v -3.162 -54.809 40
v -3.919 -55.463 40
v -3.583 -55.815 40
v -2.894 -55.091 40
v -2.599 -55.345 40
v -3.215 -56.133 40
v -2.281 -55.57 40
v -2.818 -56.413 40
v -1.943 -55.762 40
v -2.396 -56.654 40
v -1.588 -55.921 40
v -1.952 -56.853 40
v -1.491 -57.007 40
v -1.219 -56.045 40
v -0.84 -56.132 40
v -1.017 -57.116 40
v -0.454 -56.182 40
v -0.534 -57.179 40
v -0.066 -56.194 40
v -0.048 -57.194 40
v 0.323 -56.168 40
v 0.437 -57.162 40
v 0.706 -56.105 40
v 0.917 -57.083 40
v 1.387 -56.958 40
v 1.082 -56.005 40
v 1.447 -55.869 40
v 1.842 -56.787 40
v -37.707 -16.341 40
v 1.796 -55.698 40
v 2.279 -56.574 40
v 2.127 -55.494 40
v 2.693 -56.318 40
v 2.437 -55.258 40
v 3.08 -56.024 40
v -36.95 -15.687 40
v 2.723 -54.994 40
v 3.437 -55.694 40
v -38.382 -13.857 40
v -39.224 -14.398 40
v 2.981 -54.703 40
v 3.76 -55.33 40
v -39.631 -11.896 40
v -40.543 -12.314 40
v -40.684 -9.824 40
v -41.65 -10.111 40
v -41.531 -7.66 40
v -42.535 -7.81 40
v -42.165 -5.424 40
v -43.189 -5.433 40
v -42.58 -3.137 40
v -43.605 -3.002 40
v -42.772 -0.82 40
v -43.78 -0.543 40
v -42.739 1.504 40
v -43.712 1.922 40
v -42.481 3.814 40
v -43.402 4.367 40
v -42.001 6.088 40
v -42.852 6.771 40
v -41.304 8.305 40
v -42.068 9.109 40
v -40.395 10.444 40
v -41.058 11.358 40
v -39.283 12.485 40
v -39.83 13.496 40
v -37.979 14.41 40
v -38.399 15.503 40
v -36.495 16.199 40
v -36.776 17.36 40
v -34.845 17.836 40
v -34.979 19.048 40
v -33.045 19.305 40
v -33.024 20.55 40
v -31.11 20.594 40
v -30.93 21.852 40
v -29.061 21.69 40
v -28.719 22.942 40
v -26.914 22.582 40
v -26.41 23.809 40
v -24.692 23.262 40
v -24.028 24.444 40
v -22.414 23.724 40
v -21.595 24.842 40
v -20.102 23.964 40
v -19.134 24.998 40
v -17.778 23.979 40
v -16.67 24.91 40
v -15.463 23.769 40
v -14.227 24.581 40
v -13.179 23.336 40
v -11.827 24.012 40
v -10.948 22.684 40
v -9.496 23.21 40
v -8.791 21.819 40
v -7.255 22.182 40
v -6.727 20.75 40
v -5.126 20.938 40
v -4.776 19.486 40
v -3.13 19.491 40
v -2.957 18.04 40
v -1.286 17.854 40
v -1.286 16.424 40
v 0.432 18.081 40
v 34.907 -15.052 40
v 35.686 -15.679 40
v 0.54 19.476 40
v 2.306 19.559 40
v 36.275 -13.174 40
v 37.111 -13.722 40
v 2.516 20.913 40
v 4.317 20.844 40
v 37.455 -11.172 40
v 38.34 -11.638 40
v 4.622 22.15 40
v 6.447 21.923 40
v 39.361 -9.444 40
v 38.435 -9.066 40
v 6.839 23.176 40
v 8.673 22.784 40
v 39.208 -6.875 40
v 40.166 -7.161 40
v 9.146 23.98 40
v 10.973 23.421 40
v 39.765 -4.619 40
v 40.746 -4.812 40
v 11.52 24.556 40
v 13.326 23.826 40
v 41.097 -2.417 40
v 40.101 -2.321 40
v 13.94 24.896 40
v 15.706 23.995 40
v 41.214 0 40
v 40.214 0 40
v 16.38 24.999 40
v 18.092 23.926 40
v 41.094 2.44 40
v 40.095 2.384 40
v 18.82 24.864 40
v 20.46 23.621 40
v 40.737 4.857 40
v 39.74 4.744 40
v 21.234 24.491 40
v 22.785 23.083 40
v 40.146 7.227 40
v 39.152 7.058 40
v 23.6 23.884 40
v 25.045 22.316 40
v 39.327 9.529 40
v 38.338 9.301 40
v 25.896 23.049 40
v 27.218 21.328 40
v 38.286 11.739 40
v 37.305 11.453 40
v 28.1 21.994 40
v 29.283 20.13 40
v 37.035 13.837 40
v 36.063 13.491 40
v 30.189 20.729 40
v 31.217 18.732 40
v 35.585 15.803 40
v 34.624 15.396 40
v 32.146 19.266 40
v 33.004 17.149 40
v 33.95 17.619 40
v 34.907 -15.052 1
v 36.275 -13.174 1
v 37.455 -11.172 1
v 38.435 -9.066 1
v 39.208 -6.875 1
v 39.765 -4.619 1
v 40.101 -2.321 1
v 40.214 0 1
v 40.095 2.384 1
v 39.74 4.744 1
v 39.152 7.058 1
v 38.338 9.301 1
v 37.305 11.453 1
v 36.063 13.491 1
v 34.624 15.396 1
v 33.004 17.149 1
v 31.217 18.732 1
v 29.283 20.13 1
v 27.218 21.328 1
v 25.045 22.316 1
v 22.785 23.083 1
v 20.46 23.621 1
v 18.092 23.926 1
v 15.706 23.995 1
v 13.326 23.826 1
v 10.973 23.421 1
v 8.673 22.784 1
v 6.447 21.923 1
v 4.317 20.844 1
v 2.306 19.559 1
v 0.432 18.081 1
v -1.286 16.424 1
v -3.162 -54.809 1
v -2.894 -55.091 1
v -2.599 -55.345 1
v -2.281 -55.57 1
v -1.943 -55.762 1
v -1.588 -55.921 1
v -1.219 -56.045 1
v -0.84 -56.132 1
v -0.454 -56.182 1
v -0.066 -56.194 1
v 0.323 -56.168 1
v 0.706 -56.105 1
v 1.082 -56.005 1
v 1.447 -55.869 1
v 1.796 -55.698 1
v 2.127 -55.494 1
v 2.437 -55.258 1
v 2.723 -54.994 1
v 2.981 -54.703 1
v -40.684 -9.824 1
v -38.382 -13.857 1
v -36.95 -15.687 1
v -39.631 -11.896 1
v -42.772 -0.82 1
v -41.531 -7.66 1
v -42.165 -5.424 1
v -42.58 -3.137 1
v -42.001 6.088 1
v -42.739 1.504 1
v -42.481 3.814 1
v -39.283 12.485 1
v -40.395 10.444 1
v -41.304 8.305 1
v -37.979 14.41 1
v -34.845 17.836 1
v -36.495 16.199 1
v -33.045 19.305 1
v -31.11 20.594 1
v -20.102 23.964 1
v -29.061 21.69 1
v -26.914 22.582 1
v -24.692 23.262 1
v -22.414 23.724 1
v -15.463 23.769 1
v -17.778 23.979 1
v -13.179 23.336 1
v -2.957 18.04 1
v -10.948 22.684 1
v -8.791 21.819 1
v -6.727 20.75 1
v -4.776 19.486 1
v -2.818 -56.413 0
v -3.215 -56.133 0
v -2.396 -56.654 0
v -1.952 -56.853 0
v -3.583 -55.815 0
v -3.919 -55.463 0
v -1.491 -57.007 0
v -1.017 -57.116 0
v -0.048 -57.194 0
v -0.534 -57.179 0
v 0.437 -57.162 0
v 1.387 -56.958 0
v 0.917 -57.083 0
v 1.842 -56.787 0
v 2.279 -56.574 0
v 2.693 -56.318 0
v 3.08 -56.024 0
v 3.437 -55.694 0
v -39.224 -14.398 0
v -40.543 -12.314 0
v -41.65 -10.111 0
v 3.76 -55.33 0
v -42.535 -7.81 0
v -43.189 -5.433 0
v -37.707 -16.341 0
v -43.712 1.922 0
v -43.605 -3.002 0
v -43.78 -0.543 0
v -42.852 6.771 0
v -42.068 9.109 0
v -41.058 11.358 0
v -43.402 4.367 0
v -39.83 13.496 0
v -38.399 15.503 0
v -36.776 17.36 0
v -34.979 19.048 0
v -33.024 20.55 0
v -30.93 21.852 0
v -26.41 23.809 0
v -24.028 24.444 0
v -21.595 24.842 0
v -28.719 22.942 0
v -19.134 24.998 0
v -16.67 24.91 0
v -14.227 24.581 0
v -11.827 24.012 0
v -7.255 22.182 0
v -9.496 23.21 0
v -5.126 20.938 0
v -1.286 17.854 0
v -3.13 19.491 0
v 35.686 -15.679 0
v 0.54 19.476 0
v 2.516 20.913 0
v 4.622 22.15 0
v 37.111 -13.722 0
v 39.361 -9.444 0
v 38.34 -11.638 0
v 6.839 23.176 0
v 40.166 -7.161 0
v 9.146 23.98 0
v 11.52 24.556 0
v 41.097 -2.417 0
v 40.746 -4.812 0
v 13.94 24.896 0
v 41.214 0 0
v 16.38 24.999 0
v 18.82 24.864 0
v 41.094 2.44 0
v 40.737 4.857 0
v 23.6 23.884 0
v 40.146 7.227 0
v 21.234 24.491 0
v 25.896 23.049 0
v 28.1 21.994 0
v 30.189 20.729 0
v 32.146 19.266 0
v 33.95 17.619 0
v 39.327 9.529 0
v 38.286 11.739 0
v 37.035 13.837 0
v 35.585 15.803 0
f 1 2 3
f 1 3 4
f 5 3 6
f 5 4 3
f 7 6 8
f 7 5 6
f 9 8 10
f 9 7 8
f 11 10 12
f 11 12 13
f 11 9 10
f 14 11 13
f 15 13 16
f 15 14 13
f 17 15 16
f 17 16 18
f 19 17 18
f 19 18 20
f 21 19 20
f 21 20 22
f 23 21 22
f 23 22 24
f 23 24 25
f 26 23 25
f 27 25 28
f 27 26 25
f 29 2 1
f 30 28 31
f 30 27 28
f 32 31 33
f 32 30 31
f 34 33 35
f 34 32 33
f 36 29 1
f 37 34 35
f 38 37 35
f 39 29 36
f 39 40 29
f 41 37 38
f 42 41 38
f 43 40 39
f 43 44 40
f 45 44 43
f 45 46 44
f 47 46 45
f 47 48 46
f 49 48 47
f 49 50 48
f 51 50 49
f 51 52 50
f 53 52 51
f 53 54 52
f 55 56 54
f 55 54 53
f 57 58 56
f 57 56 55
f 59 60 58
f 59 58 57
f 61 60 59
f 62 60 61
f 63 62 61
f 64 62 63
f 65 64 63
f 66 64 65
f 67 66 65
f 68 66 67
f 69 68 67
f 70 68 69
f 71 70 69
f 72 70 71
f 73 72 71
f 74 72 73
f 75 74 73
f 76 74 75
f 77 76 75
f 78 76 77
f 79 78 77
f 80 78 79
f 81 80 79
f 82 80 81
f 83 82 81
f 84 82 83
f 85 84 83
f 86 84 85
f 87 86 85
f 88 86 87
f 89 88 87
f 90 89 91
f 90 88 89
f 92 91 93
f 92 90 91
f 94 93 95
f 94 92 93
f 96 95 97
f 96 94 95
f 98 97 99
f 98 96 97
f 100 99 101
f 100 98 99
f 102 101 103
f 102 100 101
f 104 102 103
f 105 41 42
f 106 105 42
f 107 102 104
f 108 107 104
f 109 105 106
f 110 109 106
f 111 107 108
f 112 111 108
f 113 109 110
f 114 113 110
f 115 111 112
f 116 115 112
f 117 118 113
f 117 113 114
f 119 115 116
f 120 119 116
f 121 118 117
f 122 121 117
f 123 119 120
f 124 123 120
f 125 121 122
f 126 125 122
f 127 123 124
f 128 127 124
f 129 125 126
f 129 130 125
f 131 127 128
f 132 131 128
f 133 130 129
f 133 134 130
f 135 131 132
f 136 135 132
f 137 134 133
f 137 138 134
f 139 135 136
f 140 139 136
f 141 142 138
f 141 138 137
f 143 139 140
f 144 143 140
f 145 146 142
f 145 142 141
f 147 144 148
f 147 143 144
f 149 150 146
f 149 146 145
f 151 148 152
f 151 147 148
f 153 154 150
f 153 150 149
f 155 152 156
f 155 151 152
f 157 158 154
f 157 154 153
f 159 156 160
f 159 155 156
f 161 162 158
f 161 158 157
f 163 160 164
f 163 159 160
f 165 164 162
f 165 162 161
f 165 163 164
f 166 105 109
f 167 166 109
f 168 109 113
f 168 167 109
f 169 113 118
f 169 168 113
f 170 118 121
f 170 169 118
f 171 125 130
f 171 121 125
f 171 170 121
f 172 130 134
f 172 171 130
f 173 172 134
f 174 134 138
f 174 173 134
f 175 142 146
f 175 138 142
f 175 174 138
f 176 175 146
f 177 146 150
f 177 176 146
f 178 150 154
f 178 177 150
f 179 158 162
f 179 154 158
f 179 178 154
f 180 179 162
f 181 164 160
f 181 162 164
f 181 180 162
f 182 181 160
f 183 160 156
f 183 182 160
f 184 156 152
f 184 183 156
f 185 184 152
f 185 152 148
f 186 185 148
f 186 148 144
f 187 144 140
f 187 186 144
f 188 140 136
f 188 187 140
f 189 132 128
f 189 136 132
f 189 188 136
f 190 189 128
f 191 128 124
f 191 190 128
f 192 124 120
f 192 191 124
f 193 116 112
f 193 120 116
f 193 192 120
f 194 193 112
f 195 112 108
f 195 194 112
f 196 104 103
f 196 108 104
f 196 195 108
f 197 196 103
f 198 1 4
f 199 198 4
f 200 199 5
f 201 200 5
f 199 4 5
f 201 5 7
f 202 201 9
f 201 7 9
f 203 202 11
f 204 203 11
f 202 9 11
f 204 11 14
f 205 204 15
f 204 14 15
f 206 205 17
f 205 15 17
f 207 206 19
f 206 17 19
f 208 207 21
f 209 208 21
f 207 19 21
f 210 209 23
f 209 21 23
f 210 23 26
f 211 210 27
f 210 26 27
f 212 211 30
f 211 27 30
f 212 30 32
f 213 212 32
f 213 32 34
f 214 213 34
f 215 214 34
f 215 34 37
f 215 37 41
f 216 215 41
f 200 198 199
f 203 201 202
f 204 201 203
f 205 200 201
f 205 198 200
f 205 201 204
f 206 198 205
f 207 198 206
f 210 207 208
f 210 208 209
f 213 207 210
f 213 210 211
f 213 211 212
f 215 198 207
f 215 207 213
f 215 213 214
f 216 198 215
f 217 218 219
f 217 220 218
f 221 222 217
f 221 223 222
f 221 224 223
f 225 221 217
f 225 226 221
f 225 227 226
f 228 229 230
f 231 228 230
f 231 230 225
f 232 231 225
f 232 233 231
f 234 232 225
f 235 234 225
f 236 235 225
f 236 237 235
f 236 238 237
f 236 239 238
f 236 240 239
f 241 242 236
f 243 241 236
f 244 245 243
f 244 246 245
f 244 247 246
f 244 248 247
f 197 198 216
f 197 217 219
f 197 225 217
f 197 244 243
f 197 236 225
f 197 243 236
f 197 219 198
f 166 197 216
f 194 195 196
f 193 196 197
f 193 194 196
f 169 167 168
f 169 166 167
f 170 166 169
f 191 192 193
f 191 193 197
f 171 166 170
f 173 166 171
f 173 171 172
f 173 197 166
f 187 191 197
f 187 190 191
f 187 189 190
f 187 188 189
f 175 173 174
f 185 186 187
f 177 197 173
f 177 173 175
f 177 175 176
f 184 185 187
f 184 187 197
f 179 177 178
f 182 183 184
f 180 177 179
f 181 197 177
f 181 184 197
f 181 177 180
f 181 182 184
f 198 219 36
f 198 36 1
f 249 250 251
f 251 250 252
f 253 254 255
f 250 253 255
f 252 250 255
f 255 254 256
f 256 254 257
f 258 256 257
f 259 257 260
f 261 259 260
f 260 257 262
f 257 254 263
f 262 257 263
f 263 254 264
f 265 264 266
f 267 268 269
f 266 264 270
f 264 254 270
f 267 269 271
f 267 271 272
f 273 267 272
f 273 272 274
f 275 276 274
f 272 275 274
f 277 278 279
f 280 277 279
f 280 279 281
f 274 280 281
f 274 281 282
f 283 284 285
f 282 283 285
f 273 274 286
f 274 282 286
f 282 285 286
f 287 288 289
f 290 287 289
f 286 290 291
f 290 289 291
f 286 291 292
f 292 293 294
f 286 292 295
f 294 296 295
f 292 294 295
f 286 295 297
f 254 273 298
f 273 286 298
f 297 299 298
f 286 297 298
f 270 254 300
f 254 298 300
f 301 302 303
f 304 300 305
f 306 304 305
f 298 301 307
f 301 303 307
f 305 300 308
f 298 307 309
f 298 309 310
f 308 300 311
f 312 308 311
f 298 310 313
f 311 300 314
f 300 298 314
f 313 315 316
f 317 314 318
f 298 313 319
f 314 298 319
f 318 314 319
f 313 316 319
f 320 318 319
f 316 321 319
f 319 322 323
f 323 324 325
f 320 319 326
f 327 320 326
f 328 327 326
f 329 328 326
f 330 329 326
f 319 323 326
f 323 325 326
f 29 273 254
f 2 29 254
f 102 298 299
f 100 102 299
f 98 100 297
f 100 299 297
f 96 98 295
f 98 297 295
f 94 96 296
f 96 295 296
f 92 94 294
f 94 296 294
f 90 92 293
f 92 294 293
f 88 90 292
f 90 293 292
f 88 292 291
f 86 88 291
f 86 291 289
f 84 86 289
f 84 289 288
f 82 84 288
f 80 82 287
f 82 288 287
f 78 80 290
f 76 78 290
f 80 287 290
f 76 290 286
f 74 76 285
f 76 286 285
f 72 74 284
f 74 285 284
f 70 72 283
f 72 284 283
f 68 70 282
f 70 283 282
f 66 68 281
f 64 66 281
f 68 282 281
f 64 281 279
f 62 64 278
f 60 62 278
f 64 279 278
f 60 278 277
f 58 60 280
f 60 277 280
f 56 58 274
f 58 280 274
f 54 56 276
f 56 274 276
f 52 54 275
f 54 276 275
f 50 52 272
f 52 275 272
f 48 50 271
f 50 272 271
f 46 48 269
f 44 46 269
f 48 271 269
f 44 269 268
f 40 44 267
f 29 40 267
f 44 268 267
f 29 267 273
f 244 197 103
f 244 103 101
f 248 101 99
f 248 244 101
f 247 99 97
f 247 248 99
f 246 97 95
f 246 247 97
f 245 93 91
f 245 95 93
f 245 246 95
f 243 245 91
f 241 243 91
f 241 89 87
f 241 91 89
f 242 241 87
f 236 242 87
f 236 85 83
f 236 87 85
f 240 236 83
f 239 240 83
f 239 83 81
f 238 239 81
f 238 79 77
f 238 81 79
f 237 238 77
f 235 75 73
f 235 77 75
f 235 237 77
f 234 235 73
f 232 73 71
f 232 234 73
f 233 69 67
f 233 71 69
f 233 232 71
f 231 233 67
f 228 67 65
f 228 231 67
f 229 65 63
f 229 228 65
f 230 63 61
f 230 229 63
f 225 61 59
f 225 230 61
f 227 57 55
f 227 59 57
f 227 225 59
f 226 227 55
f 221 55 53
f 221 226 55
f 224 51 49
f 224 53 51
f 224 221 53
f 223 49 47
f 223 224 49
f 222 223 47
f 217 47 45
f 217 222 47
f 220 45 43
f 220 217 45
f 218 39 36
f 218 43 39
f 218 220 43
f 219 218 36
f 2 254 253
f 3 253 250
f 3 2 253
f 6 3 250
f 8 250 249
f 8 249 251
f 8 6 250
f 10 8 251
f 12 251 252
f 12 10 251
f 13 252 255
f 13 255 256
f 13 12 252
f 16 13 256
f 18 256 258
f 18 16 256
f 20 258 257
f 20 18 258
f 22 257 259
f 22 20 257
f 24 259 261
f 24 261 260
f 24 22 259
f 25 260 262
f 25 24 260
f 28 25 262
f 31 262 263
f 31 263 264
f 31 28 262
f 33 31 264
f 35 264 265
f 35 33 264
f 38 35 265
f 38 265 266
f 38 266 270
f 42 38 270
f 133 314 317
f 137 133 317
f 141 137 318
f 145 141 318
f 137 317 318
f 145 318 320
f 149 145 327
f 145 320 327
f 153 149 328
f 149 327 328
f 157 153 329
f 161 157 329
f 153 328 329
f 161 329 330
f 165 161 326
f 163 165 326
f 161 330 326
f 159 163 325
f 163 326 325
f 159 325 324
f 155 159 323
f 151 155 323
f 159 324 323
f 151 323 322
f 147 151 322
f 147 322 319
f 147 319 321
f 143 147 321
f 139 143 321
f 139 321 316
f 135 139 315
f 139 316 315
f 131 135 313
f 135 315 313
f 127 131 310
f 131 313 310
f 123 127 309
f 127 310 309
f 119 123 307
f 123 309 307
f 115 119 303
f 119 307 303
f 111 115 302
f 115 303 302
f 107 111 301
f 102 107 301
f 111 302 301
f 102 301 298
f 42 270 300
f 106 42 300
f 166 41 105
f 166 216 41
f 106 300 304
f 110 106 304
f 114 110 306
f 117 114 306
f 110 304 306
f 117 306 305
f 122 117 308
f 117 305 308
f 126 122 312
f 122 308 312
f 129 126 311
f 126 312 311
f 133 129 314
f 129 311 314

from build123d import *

# Parameters (mm, degrees)
F1_DEPTH = 40
F2_R     = 5
F3_T     = -1


with BuildPart() as f1:
    # F0 (on Top) → F1 (new body)
    with BuildSketch(Plane.XY):
        with BuildLine():
            ThreePointArc((-1.2863303848, -17.8535710714), (4.2625307585, -9.6824583655), (6.2136696152, 0))
            ThreePointArc((6.2136696152, 0), (4.2625307585, 9.6824583655), (-1.2863303848, 17.8535710714))
            ThreePointArc((-1.2863303848, 17.8535710714), (-8.7863303848, 0), (-1.2863303848, -17.8535710714))
        make_face()
        with BuildLine():
            ThreePointArc((-1.2863303848, 17.8535710714), (4.2625307585, 9.6824583655), (6.2136696152, 0))
            ThreePointArc((6.2136696152, 0), (4.2625307585, -9.6824583655), (-1.2863303848, -17.8535710714))
            ThreePointArc((-1.2863303848, -17.8535710714), (17.6817434111, -24.9568579619), (35.6861864672, -15.6786825802))
            ThreePointArc((35.6861864672, -15.6786825802), (39.7913383009, -8.3122523633), (41.2136696152, 0))
            ThreePointArc((41.2136696152, 0), (25.8961279808, 23.0488611432), (-1.2863303848, 17.8535710714))
        make_face()
        with BuildLine():
            ThreePointArc((-1.2863303848, -17.8535710714), (-8.7863303848, 0), (-1.2863303848, 17.8535710714))
            ThreePointArc((-1.2863303848, 17.8535710714), (-35.8982282908, 18.2258868112), (-37.7066974288, -16.3407377715))
            ThreePointArc((-37.7066974288, -16.3407377715), (-19.8238884715, -24.9784601851), (-1.2863303848, -17.8535710714))
        make_face()
        with BuildLine():
            ThreePointArc((35.6861864672, -15.6786825802), (17.6817434111, -24.9568579619), (-1.2863303848, -17.8535710714))
            ThreePointArc((-1.2863303848, -17.8535710714), (-19.8238884715, -24.9784601851), (-37.7066974288, -16.3407377715))
            Line((-37.7066974288, -16.3407377715), (0, -60))
            Line((0, -60), (35.6861864672, -15.6786825802))
        make_face()
    extrude(amount=F1_DEPTH)

    # F2
    f2_edges = [f1.edges().sort_by_distance(p)[0] for p in [
        (0, -60, 20),
    ]]
    fillet(f2_edges, radius=F2_R)

    # F3
    f3_openings = [f1.faces().sort_by_distance(p)[0] for p in [
        (-1.14081, -8.463934, 40),
    ]]
    offset(amount=F3_T, openings=f3_openings, kind=Kind.INTERSECTION)


solid = f1.part
